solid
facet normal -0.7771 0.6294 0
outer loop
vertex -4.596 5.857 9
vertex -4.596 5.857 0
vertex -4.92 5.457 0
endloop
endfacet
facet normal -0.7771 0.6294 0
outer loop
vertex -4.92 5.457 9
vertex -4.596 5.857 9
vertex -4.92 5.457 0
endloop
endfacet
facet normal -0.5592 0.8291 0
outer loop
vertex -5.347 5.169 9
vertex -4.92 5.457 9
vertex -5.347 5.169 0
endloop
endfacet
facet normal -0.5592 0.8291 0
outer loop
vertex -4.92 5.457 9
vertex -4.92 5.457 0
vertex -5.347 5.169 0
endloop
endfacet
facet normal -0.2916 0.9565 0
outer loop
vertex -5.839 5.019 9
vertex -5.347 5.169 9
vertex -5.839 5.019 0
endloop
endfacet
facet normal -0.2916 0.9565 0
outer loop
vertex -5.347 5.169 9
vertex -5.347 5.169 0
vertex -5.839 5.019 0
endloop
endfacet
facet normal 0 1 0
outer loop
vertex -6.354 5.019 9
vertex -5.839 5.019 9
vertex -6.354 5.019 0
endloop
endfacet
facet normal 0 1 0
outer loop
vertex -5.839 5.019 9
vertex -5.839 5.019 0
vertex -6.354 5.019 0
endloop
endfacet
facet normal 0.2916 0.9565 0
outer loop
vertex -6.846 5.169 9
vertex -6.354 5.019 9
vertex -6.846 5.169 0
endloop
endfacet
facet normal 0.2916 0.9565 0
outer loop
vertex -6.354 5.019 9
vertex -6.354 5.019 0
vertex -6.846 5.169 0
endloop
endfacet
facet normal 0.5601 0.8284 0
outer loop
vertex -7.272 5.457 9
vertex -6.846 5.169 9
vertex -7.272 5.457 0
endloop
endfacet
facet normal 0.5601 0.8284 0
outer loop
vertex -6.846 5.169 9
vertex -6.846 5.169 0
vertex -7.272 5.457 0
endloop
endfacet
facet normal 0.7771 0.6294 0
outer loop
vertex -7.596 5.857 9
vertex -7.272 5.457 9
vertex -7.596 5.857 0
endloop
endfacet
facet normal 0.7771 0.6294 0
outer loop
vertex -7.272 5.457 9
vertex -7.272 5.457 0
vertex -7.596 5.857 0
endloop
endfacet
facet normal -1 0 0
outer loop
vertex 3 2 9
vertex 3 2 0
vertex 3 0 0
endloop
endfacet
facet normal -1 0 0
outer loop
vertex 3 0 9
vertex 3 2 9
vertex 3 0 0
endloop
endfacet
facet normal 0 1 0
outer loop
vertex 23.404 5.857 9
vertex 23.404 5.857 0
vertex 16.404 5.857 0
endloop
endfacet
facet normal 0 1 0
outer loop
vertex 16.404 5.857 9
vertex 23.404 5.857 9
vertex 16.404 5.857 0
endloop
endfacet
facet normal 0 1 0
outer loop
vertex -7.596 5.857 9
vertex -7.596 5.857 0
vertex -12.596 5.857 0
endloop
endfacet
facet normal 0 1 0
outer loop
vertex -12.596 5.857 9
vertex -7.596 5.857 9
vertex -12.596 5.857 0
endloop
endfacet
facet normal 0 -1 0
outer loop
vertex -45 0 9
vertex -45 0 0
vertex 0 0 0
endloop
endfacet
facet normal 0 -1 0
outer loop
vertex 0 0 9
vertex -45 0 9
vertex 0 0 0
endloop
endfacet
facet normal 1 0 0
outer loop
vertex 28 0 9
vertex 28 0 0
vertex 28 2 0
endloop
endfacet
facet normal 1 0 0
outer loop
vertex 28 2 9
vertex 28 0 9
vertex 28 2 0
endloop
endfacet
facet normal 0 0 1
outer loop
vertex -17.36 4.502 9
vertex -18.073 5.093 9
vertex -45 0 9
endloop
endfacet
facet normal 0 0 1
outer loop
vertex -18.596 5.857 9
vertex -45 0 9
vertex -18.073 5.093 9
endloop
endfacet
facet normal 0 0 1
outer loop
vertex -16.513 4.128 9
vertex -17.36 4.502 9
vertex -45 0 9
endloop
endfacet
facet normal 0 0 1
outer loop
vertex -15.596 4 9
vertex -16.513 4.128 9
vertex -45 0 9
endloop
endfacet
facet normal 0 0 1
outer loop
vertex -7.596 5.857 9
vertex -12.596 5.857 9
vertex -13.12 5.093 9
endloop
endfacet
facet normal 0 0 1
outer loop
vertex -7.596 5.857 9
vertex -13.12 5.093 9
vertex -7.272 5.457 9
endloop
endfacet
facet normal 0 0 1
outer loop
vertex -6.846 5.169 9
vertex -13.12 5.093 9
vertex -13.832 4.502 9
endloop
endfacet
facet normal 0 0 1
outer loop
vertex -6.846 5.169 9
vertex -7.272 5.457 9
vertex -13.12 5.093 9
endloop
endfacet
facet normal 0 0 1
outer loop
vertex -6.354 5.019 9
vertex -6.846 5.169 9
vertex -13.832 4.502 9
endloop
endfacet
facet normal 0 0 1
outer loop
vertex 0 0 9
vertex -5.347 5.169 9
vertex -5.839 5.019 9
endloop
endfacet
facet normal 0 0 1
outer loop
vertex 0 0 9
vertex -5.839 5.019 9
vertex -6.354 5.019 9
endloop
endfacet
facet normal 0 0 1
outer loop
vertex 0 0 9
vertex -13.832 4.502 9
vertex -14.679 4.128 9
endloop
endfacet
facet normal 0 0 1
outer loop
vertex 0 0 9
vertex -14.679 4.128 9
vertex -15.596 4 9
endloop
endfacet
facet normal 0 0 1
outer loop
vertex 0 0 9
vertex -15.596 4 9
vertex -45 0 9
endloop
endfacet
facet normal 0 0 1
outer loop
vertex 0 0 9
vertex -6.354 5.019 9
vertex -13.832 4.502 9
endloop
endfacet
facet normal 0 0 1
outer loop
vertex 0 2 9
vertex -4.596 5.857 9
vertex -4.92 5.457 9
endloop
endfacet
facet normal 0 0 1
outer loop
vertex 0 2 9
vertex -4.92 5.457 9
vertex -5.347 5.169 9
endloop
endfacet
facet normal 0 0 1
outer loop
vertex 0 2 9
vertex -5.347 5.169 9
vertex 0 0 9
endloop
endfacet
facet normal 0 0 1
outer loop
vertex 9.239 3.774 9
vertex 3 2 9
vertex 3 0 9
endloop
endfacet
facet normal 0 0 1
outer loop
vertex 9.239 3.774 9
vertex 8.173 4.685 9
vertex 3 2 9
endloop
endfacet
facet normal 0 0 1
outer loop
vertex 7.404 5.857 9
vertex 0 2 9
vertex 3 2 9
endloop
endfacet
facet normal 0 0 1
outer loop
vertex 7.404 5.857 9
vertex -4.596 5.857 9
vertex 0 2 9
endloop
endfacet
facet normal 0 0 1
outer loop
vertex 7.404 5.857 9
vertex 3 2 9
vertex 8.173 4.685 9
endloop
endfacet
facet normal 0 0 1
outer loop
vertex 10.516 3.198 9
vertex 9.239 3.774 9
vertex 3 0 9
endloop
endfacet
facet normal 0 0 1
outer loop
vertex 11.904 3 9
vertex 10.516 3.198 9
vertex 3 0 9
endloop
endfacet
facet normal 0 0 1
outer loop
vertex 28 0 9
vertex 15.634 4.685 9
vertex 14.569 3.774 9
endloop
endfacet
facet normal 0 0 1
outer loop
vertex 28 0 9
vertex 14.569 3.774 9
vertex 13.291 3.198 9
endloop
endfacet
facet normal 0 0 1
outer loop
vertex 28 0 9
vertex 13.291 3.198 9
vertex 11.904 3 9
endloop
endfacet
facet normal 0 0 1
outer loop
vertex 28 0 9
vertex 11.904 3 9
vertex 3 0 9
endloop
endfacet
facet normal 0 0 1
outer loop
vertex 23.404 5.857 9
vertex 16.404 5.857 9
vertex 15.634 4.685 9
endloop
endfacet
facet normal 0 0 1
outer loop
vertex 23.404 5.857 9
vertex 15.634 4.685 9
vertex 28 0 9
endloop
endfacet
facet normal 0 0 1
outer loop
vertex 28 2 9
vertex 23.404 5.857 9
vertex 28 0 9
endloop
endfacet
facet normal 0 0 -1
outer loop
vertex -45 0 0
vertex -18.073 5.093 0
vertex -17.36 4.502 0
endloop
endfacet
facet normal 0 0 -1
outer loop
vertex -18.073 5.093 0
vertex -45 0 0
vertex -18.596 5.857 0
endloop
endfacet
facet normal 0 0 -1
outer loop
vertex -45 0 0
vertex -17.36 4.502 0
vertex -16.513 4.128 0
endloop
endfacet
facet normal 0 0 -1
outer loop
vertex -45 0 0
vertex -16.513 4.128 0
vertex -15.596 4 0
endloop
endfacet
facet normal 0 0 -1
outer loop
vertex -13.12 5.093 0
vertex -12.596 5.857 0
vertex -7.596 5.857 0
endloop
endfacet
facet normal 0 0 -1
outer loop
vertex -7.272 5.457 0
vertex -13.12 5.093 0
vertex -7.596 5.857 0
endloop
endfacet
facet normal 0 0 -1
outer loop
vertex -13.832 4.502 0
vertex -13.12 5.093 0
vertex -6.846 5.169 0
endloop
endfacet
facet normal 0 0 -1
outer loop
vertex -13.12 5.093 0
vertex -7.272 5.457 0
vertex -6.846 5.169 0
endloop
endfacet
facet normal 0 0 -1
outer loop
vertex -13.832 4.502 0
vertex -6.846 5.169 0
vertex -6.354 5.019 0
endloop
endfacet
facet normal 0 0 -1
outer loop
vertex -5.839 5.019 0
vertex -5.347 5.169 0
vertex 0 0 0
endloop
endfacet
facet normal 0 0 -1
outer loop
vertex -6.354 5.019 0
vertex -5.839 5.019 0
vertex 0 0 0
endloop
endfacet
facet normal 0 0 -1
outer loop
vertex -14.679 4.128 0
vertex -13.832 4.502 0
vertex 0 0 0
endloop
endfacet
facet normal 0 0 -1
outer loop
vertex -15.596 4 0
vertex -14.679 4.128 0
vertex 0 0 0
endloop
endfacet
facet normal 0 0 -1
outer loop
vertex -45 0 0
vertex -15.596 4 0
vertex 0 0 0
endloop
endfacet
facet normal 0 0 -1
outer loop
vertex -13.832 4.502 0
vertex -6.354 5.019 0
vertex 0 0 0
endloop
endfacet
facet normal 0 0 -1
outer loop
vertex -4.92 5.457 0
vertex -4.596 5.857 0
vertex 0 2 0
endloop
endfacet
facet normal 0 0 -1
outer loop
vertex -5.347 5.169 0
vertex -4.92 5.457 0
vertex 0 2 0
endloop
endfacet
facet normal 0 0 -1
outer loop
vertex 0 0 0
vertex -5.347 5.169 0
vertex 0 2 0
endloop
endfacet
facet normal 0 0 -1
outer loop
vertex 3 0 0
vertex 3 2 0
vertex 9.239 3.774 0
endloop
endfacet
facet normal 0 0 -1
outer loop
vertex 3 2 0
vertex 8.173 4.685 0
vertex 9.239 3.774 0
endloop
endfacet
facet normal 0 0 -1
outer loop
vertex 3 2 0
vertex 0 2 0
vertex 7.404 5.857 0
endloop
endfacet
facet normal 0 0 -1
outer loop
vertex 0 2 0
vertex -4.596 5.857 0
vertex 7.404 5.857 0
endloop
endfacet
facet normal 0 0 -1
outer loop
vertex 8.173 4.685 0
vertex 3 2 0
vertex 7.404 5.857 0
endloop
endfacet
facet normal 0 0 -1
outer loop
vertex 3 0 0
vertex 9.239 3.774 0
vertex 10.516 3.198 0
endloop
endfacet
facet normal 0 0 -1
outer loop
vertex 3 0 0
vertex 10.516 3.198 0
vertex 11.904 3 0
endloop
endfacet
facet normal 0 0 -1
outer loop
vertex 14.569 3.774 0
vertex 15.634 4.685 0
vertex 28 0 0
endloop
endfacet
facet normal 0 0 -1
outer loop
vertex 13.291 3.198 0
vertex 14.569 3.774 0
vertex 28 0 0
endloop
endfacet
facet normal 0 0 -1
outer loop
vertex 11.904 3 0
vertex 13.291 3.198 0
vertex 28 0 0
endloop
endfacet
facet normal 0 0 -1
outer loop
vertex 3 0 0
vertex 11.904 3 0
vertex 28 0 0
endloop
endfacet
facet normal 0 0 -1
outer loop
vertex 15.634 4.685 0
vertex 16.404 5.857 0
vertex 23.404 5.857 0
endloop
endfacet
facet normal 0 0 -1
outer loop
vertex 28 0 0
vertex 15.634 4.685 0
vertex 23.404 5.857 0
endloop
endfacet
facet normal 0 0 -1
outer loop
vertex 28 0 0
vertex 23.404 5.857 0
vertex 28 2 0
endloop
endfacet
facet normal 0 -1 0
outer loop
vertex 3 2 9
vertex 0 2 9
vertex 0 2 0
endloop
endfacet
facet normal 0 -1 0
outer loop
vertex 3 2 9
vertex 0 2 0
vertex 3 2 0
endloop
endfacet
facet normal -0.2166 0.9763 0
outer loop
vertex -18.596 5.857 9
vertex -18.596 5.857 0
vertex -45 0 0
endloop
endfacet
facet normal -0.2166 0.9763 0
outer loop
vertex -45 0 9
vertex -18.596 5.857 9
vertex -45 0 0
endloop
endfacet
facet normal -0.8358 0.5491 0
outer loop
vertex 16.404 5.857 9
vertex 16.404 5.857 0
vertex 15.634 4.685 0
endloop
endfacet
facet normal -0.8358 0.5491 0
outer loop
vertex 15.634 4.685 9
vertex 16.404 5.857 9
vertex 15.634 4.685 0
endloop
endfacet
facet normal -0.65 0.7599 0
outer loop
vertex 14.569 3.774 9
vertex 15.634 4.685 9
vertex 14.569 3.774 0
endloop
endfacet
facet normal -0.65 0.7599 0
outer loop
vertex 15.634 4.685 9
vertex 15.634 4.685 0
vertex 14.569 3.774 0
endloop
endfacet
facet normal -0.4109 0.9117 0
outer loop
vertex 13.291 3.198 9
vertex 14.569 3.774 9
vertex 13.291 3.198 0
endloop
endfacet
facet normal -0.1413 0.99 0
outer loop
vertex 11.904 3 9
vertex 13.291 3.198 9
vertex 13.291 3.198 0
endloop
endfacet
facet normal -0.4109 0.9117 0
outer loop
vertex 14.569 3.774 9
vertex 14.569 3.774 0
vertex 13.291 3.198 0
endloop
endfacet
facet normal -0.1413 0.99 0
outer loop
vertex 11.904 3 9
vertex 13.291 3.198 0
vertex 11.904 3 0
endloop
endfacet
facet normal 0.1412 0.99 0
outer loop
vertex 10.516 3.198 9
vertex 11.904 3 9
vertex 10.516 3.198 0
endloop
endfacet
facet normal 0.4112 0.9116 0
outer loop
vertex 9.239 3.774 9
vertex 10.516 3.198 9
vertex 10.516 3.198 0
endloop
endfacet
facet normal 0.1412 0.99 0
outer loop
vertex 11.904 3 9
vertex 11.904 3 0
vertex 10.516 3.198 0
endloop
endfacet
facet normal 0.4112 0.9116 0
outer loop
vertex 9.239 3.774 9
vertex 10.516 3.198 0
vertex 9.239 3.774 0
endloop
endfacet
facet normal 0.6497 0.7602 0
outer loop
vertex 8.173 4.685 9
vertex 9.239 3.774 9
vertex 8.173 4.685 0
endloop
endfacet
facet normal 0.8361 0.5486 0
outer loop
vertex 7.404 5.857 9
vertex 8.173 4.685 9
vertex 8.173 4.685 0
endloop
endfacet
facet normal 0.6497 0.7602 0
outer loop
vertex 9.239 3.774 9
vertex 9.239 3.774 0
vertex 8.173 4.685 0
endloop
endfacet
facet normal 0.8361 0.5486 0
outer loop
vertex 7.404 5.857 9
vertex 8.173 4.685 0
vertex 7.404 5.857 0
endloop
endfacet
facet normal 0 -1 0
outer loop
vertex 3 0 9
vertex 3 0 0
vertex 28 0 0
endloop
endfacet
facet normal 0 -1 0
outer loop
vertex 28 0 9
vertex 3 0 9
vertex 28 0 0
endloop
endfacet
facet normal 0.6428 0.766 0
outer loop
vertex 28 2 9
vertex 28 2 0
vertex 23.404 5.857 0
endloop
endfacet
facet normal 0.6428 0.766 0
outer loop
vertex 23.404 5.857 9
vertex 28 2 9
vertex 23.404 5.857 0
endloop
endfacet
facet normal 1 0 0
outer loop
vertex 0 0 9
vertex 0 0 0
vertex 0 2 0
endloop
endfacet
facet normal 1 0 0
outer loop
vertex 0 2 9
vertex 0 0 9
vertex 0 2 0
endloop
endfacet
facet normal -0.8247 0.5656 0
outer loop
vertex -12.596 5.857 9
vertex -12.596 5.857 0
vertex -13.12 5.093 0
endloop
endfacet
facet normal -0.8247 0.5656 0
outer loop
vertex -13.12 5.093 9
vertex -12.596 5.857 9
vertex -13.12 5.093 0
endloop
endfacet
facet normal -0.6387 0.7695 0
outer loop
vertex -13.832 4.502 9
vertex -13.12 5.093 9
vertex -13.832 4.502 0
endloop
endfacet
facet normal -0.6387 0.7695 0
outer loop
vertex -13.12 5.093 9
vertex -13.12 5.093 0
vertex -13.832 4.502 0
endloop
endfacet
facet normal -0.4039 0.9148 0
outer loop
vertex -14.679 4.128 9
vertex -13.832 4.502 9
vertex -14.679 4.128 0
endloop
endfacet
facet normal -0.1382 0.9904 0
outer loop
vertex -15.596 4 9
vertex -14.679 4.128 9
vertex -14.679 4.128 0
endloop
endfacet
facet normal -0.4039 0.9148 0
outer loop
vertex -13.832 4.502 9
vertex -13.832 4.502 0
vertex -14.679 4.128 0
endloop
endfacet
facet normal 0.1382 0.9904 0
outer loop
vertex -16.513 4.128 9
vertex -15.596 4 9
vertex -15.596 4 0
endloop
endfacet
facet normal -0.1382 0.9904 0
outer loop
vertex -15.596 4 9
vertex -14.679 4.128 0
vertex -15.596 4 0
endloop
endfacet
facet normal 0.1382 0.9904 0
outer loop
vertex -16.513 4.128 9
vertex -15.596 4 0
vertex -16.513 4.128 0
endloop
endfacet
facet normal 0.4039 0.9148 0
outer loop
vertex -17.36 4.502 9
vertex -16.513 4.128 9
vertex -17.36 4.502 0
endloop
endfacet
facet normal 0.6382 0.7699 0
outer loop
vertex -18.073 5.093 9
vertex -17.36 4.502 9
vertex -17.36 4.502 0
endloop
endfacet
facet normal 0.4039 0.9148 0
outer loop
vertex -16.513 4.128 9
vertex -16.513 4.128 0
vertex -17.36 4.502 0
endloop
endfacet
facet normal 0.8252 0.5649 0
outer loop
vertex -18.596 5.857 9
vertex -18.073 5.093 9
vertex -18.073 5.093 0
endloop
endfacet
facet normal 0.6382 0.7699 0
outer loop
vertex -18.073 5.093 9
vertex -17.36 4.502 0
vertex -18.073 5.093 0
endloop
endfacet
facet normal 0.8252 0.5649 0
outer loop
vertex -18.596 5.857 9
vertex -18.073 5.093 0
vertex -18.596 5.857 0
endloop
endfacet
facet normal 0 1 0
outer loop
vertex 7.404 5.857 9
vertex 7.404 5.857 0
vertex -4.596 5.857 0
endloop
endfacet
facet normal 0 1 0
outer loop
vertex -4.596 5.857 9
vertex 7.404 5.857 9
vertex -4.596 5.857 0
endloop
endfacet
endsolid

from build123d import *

# Parameters (mm, degrees)
F1_DEPTH = 9


with BuildPart() as f1:
    # F0 (on Top) → F1 (new body)
    with BuildSketch(Plane.XY):
        with BuildLine():
            Line((-45, 0), (0, 0))
            Line((0, 0), (0, 2))
            Line((0, 2), (3, 2))
            Line((3, 2), (3, 0))
            Line((3, 0), (28, 0))
            Line((28, 0), (28, 2))
            Line((28, 2), (23.403733, 5.856726))
            Line((23.403733, 5.856726), (16.403733, 5.856726))
            ThreePointArc((16.403733, 5.856726), (11.903733, 3), (7.403733, 5.856726))
            Line((7.403733, 5.856726), (-4.596267, 5.856726))
            ThreePointArc((-4.596267, 5.856726), (-6.096267, 5), (-7.596267, 5.856726))
            Line((-7.596267, 5.856726), (-12.596267, 5.856726))
            ThreePointArc((-12.596267, 5.856726), (-15.596267, 4), (-18.596267, 5.856726))
            Line((-18.596267, 5.856726), (-45, 0))
        make_face()
    extrude(amount=F1_DEPTH)


solid = f1.part
